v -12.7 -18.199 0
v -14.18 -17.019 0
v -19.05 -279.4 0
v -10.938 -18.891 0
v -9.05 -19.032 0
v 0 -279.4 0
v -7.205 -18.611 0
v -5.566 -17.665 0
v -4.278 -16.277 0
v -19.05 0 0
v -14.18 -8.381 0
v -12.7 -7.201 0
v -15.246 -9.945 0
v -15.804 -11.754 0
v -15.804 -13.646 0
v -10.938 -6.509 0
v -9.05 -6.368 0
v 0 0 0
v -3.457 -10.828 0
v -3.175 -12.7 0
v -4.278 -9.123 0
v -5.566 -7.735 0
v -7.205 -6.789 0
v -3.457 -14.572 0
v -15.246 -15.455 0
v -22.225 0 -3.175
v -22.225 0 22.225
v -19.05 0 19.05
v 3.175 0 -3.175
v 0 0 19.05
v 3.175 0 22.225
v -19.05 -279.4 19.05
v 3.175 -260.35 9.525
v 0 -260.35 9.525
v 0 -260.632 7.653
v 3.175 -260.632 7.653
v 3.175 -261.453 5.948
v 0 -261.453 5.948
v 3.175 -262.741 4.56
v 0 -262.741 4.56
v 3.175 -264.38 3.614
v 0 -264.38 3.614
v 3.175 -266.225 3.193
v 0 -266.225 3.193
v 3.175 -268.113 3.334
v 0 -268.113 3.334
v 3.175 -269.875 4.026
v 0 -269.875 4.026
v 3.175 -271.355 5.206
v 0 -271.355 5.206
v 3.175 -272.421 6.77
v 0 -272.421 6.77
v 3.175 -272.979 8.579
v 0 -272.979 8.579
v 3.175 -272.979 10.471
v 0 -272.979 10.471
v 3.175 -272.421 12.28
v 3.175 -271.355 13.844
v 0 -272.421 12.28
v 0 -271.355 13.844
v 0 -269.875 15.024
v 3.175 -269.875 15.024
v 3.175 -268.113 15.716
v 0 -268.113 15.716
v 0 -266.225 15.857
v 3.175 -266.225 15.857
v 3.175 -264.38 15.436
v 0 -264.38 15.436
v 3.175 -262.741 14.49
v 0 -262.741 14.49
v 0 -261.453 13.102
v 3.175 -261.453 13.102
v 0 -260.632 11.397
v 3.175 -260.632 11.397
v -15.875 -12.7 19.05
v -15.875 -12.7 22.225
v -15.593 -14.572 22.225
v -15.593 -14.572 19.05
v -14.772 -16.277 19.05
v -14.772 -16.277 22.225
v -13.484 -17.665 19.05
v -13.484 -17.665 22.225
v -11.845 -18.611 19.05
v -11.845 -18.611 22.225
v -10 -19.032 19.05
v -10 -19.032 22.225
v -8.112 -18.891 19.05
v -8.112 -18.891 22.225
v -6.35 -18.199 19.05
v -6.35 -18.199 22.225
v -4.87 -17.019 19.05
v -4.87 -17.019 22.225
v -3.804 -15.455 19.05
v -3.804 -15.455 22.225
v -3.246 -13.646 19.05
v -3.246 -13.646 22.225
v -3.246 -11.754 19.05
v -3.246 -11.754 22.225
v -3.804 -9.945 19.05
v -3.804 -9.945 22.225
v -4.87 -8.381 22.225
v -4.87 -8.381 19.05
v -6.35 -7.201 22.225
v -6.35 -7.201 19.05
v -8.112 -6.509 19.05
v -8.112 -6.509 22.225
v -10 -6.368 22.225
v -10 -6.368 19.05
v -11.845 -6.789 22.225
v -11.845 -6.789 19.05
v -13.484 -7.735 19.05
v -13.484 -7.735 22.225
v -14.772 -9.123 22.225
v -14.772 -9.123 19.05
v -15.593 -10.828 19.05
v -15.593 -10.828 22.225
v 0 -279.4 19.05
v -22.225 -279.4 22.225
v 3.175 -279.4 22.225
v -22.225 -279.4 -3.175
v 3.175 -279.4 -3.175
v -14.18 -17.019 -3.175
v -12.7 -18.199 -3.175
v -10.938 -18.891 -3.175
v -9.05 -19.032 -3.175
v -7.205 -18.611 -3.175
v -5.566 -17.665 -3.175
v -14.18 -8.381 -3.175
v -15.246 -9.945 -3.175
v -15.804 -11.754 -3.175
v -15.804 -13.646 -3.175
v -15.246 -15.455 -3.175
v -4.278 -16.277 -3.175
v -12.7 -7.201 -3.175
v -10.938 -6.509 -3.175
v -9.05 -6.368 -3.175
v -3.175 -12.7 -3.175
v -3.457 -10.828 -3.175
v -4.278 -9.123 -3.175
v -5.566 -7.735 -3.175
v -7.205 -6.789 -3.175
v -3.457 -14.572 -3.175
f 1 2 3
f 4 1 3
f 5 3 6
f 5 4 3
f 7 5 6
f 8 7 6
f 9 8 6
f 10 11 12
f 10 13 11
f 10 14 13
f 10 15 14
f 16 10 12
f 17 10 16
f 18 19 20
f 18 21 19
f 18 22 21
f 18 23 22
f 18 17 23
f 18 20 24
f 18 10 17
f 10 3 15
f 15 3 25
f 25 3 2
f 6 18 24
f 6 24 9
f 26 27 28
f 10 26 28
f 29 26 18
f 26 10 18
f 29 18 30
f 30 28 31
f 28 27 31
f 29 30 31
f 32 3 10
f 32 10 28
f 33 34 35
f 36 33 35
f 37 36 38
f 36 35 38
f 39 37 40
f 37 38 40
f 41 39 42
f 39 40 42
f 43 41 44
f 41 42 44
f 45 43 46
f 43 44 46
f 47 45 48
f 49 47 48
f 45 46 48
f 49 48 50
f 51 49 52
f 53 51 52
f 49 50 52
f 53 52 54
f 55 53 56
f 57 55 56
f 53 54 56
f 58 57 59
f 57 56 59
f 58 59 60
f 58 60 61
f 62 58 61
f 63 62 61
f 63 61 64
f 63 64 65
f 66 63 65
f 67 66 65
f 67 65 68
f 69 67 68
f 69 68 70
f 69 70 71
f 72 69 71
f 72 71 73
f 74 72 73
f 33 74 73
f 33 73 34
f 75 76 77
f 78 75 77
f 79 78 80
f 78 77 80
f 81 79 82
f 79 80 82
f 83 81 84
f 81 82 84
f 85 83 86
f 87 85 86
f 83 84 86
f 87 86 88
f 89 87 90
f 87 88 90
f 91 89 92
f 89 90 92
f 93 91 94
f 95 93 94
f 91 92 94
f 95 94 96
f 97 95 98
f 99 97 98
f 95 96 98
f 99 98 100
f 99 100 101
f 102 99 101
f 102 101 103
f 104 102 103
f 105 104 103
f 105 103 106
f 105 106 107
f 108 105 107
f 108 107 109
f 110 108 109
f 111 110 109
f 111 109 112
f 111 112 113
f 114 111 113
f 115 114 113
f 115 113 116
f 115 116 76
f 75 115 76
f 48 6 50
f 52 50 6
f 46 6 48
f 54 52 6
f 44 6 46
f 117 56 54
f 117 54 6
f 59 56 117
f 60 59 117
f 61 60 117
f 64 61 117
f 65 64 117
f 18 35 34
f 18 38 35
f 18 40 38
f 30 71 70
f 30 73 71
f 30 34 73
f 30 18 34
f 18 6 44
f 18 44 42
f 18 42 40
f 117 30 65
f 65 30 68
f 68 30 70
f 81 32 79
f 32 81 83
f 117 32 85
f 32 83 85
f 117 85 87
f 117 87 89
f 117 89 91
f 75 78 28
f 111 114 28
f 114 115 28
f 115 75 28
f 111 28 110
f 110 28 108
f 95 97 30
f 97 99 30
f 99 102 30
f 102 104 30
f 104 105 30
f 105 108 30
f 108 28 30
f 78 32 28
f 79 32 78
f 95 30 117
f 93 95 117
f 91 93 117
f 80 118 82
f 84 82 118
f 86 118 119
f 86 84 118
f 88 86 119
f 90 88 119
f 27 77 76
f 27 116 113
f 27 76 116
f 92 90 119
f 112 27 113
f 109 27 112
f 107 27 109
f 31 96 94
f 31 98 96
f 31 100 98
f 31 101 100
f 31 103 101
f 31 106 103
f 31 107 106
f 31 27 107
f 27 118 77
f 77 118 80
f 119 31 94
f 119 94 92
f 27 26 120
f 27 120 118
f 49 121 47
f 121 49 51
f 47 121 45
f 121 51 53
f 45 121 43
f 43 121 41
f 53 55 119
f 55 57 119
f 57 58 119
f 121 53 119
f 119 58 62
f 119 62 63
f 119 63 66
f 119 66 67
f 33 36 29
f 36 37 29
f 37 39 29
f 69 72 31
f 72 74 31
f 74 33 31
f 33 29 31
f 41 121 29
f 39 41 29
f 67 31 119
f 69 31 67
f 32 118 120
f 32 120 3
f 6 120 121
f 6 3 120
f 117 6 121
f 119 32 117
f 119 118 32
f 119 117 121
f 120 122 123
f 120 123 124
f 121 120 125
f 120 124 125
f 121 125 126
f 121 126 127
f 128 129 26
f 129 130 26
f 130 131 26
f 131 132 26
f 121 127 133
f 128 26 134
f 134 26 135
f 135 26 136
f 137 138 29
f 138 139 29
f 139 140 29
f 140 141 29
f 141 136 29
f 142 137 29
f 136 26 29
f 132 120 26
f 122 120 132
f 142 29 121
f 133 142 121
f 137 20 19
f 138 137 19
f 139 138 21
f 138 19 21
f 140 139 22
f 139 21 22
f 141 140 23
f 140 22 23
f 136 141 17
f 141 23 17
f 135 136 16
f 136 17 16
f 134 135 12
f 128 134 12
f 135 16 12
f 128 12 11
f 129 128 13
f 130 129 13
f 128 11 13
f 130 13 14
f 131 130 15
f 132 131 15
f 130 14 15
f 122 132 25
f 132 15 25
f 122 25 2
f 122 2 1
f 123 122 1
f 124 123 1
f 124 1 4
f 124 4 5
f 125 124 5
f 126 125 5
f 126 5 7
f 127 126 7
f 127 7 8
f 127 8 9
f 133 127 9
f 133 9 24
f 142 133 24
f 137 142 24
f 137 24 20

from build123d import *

# Parameters (mm, degrees)
F0_W     = 25.4
F0_H     = 25.4
F0_W_2   = 19.05
F0_H_2   = 19.05
F1_DEPTH = 279.4
F3_D     = 12.7
F3_DEPTH = 3.176
F5_D     = 12.7
F7_D     = 12.7
F7_DEPTH = 3.176


with BuildPart() as f1:
    # F0 (on Front) → F1 (new body)
    with BuildSketch(Plane.XZ):
        with Locations((-9.525, 9.525)):
            Rectangle(F0_W, F0_H)
        with Locations((-9.525, 9.525)):
            Rectangle(F0_W_2, F0_H_2, mode=Mode.SUBTRACT)
    extrude(amount=F1_DEPTH)

    # F3 (through all, one way)
    with BuildSketch(Plane.XY):
        with Locations((-9.525, -12.7)):
            Circle(F3_D / 2)
    extrude(amount=-F3_DEPTH, mode=Mode.SUBTRACT)

    # F5 (through all)
    with Locations(Plane(origin=(0, 0, 0), x_dir=(1, 0, 0), z_dir=(0, 0, -1))):
        with Locations((-9.525, 12.7)):
            Hole(F5_D / 2)

    # F7 (through all, one way)
    with BuildSketch(Plane(origin=(0, 0, 0), x_dir=(0, 1, 0), z_dir=(-1, 0, 0))):
        with Locations((-266.7, -9.525)):
            Circle(F7_D / 2)
    extrude(amount=-F7_DEPTH, mode=Mode.SUBTRACT)


solid = f1.part
